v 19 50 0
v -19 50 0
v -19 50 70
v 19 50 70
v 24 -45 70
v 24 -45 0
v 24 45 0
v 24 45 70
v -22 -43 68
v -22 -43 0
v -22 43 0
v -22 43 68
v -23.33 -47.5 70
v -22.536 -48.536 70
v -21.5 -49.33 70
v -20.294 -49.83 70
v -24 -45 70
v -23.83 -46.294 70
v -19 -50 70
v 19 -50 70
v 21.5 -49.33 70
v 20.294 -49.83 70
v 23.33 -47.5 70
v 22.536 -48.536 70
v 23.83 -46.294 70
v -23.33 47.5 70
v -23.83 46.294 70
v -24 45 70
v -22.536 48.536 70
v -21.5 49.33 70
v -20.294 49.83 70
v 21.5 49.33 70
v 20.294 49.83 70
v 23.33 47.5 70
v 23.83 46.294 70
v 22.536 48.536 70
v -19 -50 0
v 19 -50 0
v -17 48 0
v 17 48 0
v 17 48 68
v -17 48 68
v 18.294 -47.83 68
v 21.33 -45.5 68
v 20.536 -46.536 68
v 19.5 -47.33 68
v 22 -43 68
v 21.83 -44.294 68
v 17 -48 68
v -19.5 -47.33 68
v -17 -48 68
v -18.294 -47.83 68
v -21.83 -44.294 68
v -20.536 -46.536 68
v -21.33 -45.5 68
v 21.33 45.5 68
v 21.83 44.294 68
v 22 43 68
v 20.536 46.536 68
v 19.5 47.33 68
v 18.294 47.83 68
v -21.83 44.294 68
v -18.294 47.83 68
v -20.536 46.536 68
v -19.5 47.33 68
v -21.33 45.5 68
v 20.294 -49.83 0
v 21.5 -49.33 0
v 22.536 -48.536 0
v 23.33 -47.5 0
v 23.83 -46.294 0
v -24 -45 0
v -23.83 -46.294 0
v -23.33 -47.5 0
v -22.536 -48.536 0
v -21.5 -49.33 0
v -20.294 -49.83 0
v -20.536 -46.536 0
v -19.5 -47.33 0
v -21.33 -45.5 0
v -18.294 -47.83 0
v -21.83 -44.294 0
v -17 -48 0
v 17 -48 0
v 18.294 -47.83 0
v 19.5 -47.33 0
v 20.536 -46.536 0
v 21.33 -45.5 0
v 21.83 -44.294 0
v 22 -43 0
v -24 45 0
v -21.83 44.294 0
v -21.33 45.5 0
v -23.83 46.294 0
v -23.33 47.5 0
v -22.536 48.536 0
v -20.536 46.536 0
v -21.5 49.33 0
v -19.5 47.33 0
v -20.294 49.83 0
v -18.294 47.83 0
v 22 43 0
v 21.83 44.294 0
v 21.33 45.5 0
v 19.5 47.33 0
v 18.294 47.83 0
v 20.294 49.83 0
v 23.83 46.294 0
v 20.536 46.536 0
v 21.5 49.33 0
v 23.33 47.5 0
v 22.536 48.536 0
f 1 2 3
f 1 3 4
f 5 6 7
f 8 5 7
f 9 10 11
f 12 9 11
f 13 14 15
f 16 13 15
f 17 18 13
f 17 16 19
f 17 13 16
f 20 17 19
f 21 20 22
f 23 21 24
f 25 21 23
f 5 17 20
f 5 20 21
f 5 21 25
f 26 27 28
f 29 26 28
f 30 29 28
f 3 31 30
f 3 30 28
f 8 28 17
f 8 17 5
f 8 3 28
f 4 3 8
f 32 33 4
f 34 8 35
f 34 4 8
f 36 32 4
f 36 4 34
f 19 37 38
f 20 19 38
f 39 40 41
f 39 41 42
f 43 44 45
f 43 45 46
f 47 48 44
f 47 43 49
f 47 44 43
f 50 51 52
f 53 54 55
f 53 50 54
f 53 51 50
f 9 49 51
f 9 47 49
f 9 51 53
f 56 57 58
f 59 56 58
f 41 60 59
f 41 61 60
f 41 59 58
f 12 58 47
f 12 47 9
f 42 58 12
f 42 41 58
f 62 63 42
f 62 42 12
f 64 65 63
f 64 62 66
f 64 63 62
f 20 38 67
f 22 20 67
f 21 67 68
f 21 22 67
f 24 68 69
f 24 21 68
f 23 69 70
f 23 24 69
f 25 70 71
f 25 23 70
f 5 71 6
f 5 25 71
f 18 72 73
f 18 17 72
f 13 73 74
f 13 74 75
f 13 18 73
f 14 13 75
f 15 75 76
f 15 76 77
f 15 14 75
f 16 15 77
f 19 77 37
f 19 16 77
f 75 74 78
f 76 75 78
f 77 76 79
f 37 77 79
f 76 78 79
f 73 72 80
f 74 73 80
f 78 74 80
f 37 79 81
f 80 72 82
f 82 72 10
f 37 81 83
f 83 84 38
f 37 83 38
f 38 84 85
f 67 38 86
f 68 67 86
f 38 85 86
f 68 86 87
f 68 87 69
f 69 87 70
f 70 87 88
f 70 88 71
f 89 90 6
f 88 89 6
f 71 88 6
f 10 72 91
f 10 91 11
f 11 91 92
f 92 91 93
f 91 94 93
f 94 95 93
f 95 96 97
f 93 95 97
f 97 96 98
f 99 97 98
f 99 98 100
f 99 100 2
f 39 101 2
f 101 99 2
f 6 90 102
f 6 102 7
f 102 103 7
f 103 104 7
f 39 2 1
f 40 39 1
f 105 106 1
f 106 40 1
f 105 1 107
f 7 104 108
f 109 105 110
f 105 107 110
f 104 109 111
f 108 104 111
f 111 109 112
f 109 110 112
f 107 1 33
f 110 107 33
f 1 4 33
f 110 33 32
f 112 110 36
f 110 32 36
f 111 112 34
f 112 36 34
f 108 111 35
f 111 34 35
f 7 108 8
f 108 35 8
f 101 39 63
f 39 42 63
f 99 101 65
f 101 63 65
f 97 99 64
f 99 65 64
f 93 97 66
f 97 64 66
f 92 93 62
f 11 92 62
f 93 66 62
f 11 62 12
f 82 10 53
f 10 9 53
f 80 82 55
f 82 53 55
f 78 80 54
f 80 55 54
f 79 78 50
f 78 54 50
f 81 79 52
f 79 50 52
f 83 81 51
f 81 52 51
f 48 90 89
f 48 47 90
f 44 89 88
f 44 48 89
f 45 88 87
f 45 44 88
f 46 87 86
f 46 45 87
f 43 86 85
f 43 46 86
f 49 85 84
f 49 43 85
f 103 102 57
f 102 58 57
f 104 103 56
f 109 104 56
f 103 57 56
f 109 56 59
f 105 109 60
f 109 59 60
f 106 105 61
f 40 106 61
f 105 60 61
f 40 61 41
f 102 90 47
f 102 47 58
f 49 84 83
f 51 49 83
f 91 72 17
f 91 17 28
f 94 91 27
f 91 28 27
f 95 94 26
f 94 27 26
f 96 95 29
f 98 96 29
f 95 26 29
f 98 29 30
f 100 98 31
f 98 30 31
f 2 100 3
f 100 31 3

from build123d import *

# Parameters (mm, degrees)
SKETCH_1_W          = 48
SKETCH_1_H          = 100
EXTRUDE_1_DEPTH     = 70
SKETCH_2_W          = 44
SKETCH_2_H          = 96
CUT_EXTRUDE_1_DEPTH = 68
FILLET_1_R          = 5


with BuildPart() as part:
    # 草图1 → 凸台-拉伸1 (new body)
    with BuildSketch(Plane.XY):
        Rectangle(SKETCH_1_W, SKETCH_1_H)
    extrude(amount=EXTRUDE_1_DEPTH)

    # 草图2 → 切除-拉伸1 (cut)
    with BuildSketch(Plane(origin=(0, 0, 0), x_dir=(-1, 0, 0), z_dir=(0, 0, -1))):
        Rectangle(SKETCH_2_W, SKETCH_2_H)
    extrude(amount=-CUT_EXTRUDE_1_DEPTH, mode=Mode.SUBTRACT)

    # 圆角1
    fillet_1_edges = [part.edges().sort_by_distance(p)[0] for p in [
        (-22, 48, 34),
        (-22, -48, 34),
        (22, -48, 34),
        (22, 48, 34),
        (24, -50, 35),
        (-24, -50, 35),
        (-24, 50, 35),
        (24, 50, 35),
    ]]
    fillet(fillet_1_edges, radius=FILLET_1_R)


solid = part.part
